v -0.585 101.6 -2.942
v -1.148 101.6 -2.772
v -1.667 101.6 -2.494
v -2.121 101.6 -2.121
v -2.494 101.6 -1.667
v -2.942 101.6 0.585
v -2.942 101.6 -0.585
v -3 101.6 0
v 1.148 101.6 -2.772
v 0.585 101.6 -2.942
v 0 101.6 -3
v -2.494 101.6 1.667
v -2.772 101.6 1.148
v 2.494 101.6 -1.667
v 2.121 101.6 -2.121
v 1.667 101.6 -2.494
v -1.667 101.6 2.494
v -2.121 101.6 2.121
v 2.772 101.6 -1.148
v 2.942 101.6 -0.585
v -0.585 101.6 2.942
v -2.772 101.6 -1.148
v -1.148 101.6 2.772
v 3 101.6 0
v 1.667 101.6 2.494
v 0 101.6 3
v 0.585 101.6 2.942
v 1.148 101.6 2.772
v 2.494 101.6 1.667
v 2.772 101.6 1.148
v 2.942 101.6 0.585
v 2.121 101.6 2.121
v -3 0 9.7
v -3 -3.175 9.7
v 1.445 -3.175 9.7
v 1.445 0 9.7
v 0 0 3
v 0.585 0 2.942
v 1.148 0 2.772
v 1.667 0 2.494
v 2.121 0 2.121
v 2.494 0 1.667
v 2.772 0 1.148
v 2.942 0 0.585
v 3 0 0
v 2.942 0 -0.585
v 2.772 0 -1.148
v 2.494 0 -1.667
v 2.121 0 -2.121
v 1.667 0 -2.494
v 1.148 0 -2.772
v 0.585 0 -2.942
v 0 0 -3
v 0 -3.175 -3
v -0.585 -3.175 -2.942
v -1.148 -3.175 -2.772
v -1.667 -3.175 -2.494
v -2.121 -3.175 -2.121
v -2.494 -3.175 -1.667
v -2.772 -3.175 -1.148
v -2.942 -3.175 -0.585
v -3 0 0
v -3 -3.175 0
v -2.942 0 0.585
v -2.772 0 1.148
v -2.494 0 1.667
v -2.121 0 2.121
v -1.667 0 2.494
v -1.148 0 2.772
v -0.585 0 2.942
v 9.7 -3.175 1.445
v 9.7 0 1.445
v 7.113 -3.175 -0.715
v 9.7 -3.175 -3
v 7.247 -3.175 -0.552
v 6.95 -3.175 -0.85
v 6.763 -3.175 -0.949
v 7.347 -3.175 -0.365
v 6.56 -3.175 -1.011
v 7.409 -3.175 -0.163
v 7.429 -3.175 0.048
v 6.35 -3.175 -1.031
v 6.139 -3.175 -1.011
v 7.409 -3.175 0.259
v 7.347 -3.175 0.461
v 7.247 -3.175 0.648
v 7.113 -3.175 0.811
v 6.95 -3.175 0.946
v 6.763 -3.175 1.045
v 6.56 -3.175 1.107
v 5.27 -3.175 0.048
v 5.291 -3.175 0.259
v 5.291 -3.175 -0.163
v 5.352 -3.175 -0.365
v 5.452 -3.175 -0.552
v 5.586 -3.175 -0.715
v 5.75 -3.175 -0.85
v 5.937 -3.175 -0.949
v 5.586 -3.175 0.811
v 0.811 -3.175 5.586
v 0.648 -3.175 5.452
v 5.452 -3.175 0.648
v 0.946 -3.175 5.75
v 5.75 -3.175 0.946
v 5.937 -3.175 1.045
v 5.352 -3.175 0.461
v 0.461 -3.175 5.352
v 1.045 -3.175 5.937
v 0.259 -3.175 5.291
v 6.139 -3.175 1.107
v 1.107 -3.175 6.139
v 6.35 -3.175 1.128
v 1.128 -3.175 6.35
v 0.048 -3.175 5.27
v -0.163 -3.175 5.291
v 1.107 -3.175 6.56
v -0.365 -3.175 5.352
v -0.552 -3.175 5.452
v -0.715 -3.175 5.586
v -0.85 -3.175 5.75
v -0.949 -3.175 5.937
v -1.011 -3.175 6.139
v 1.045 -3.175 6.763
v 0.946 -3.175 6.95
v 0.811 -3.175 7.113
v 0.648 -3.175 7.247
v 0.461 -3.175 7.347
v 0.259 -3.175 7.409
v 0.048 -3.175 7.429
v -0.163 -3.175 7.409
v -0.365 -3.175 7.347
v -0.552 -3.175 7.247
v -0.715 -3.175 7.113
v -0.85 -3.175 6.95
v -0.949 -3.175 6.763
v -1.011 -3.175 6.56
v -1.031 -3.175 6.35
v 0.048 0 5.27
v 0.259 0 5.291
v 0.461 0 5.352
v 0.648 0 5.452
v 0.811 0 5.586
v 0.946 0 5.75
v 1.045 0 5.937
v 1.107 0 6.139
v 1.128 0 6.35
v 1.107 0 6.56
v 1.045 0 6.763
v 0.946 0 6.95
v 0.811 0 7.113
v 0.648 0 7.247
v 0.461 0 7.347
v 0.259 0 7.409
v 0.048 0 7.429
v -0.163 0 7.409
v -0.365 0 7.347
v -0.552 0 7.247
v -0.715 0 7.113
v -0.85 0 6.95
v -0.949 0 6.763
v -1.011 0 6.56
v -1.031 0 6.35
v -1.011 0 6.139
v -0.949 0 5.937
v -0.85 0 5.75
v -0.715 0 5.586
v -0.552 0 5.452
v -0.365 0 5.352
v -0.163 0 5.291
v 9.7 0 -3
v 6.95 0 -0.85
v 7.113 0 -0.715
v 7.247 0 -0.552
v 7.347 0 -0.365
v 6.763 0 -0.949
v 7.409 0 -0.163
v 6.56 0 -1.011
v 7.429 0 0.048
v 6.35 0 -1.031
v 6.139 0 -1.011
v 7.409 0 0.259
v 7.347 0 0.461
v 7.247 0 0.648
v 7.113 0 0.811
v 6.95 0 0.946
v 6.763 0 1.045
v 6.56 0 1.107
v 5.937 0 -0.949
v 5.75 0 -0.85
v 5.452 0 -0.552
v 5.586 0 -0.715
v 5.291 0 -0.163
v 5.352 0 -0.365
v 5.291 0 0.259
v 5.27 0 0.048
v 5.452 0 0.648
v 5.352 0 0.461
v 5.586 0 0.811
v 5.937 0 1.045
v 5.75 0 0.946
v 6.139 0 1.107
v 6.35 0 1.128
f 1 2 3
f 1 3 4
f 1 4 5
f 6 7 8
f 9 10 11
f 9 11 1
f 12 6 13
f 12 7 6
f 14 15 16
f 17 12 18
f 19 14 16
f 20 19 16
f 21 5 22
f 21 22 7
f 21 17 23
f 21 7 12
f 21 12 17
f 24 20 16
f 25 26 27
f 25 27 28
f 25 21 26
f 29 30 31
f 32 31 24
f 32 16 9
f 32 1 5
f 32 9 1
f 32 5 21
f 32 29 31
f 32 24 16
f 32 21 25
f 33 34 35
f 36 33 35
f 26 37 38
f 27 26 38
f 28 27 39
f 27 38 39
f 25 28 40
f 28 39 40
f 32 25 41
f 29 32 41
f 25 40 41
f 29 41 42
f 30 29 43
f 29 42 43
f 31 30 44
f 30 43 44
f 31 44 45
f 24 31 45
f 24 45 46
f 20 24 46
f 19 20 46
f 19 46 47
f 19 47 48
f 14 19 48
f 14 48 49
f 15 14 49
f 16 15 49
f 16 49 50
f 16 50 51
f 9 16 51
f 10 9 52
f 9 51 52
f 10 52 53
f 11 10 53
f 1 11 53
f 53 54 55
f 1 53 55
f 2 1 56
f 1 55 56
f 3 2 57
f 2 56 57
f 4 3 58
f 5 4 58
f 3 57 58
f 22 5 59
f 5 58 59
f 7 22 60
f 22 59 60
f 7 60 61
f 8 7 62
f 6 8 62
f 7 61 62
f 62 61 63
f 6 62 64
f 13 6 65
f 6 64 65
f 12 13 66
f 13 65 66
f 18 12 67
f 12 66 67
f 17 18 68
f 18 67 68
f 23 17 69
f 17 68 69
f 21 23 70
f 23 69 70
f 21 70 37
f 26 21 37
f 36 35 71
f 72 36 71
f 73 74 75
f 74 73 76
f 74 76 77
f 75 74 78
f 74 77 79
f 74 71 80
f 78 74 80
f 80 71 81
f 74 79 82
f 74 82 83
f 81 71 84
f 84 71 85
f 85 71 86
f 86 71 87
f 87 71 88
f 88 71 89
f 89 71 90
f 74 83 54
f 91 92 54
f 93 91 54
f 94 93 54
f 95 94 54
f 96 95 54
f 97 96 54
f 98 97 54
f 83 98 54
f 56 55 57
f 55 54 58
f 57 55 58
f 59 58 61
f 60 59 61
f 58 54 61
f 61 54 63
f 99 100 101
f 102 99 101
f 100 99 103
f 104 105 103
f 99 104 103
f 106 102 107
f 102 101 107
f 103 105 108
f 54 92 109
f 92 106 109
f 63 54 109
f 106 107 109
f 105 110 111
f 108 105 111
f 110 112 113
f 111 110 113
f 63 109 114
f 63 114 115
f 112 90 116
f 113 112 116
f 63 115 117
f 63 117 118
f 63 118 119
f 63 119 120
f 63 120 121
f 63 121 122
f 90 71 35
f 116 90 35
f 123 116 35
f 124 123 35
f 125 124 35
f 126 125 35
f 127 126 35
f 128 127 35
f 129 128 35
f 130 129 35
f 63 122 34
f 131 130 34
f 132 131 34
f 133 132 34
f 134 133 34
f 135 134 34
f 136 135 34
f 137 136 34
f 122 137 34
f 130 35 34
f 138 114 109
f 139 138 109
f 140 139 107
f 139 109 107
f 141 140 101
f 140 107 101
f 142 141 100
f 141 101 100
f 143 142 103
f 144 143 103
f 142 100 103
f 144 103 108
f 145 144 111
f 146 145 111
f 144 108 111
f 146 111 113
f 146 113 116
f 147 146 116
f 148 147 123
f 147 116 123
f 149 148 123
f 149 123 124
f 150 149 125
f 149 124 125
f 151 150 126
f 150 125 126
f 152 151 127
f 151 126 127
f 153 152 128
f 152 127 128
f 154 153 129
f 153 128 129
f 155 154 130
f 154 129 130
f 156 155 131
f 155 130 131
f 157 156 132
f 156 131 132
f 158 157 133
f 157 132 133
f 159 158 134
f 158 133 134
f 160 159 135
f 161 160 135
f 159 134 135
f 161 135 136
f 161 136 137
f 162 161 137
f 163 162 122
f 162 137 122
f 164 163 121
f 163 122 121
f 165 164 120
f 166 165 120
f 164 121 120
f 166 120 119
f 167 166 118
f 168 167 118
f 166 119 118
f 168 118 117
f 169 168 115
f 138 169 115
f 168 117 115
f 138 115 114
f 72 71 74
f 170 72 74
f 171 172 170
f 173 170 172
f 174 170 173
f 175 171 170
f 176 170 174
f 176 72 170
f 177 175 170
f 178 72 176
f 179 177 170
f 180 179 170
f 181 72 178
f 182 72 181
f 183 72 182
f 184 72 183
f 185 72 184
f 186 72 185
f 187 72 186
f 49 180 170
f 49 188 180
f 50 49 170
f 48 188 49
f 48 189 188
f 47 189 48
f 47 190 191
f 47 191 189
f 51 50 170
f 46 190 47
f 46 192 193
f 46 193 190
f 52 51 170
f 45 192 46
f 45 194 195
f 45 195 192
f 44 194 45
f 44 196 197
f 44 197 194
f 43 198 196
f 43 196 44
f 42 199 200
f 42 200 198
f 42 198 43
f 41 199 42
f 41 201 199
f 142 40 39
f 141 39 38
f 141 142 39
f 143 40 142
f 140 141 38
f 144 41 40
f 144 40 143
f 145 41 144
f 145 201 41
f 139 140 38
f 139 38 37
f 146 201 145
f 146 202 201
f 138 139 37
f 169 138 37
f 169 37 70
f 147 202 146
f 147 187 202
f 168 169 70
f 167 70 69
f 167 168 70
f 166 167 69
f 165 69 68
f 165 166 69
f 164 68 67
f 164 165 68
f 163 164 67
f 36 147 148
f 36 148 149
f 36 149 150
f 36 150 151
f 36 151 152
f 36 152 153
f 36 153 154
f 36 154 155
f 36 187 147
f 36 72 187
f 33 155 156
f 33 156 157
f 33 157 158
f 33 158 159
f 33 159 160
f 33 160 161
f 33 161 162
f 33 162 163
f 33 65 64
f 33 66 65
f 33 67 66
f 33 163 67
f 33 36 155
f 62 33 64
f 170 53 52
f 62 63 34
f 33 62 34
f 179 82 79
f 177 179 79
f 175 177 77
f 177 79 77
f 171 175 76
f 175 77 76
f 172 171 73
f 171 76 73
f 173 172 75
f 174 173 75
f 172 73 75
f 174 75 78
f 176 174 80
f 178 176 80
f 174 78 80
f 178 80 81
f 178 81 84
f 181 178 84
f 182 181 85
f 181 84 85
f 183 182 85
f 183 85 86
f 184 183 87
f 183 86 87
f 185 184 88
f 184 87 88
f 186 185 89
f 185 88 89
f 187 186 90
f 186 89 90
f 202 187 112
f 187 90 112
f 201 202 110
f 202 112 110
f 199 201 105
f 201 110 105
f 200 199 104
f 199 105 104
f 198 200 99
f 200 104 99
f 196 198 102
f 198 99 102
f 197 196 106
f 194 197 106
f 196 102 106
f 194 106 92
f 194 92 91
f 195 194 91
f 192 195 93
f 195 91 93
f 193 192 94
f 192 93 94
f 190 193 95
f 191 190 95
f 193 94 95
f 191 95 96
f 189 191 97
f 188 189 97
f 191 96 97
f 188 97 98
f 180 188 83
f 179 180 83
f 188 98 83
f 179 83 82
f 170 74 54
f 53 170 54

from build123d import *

# Parameters (mm, degrees)
SKETCH1_R           = 3
BOSS_EXTRUDE1_DEPTH = 101.6
BOSS_EXTRUDE2_START = 3.175
SKETCH3_R           = 1.0795
BOSS_EXTRUDE2_DEPTH = 3.175


with BuildPart() as part:
    # Sketch1 → Boss-Extrude1 (new body)
    with BuildSketch(Plane(origin=(0, 0, 0), x_dir=(1, 0, 0), z_dir=(0, 1, 0))):
        with Locations(Location((0, 0, 0), (0, 0, 270))):
            Circle(SKETCH1_R)
    extrude(amount=BOSS_EXTRUDE1_DEPTH)

    # Sketch3 → Boss-Extrude2 (add)
    with BuildSketch(Plane.XZ.offset(BOSS_EXTRUDE2_START)):
        with BuildLine():
            Line((-3, 0), (-3, 9.7))
            Line((-3, 9.7), (1.445, 9.7))
            Line((1.445, 9.7), (9.7, 1.445))
            Line((9.7, 1.445), (9.7, -3))
            Line((9.7, -3), (0, -3))
            ThreePointArc((0, -3), (-2.121320344, -2.121320344), (-3, 0))
        make_face()
        with Locations(Location((0.048, 6.34981858, 0), (0, 0, 270))):
            Circle(SKETCH3_R, mode=Mode.SUBTRACT)
        with Locations(Location((6.34981858, 0.048, 0), (0, 0, 270))):
            Circle(SKETCH3_R, mode=Mode.SUBTRACT)
    extrude(amount=-BOSS_EXTRUDE2_DEPTH)


solid = part.part
